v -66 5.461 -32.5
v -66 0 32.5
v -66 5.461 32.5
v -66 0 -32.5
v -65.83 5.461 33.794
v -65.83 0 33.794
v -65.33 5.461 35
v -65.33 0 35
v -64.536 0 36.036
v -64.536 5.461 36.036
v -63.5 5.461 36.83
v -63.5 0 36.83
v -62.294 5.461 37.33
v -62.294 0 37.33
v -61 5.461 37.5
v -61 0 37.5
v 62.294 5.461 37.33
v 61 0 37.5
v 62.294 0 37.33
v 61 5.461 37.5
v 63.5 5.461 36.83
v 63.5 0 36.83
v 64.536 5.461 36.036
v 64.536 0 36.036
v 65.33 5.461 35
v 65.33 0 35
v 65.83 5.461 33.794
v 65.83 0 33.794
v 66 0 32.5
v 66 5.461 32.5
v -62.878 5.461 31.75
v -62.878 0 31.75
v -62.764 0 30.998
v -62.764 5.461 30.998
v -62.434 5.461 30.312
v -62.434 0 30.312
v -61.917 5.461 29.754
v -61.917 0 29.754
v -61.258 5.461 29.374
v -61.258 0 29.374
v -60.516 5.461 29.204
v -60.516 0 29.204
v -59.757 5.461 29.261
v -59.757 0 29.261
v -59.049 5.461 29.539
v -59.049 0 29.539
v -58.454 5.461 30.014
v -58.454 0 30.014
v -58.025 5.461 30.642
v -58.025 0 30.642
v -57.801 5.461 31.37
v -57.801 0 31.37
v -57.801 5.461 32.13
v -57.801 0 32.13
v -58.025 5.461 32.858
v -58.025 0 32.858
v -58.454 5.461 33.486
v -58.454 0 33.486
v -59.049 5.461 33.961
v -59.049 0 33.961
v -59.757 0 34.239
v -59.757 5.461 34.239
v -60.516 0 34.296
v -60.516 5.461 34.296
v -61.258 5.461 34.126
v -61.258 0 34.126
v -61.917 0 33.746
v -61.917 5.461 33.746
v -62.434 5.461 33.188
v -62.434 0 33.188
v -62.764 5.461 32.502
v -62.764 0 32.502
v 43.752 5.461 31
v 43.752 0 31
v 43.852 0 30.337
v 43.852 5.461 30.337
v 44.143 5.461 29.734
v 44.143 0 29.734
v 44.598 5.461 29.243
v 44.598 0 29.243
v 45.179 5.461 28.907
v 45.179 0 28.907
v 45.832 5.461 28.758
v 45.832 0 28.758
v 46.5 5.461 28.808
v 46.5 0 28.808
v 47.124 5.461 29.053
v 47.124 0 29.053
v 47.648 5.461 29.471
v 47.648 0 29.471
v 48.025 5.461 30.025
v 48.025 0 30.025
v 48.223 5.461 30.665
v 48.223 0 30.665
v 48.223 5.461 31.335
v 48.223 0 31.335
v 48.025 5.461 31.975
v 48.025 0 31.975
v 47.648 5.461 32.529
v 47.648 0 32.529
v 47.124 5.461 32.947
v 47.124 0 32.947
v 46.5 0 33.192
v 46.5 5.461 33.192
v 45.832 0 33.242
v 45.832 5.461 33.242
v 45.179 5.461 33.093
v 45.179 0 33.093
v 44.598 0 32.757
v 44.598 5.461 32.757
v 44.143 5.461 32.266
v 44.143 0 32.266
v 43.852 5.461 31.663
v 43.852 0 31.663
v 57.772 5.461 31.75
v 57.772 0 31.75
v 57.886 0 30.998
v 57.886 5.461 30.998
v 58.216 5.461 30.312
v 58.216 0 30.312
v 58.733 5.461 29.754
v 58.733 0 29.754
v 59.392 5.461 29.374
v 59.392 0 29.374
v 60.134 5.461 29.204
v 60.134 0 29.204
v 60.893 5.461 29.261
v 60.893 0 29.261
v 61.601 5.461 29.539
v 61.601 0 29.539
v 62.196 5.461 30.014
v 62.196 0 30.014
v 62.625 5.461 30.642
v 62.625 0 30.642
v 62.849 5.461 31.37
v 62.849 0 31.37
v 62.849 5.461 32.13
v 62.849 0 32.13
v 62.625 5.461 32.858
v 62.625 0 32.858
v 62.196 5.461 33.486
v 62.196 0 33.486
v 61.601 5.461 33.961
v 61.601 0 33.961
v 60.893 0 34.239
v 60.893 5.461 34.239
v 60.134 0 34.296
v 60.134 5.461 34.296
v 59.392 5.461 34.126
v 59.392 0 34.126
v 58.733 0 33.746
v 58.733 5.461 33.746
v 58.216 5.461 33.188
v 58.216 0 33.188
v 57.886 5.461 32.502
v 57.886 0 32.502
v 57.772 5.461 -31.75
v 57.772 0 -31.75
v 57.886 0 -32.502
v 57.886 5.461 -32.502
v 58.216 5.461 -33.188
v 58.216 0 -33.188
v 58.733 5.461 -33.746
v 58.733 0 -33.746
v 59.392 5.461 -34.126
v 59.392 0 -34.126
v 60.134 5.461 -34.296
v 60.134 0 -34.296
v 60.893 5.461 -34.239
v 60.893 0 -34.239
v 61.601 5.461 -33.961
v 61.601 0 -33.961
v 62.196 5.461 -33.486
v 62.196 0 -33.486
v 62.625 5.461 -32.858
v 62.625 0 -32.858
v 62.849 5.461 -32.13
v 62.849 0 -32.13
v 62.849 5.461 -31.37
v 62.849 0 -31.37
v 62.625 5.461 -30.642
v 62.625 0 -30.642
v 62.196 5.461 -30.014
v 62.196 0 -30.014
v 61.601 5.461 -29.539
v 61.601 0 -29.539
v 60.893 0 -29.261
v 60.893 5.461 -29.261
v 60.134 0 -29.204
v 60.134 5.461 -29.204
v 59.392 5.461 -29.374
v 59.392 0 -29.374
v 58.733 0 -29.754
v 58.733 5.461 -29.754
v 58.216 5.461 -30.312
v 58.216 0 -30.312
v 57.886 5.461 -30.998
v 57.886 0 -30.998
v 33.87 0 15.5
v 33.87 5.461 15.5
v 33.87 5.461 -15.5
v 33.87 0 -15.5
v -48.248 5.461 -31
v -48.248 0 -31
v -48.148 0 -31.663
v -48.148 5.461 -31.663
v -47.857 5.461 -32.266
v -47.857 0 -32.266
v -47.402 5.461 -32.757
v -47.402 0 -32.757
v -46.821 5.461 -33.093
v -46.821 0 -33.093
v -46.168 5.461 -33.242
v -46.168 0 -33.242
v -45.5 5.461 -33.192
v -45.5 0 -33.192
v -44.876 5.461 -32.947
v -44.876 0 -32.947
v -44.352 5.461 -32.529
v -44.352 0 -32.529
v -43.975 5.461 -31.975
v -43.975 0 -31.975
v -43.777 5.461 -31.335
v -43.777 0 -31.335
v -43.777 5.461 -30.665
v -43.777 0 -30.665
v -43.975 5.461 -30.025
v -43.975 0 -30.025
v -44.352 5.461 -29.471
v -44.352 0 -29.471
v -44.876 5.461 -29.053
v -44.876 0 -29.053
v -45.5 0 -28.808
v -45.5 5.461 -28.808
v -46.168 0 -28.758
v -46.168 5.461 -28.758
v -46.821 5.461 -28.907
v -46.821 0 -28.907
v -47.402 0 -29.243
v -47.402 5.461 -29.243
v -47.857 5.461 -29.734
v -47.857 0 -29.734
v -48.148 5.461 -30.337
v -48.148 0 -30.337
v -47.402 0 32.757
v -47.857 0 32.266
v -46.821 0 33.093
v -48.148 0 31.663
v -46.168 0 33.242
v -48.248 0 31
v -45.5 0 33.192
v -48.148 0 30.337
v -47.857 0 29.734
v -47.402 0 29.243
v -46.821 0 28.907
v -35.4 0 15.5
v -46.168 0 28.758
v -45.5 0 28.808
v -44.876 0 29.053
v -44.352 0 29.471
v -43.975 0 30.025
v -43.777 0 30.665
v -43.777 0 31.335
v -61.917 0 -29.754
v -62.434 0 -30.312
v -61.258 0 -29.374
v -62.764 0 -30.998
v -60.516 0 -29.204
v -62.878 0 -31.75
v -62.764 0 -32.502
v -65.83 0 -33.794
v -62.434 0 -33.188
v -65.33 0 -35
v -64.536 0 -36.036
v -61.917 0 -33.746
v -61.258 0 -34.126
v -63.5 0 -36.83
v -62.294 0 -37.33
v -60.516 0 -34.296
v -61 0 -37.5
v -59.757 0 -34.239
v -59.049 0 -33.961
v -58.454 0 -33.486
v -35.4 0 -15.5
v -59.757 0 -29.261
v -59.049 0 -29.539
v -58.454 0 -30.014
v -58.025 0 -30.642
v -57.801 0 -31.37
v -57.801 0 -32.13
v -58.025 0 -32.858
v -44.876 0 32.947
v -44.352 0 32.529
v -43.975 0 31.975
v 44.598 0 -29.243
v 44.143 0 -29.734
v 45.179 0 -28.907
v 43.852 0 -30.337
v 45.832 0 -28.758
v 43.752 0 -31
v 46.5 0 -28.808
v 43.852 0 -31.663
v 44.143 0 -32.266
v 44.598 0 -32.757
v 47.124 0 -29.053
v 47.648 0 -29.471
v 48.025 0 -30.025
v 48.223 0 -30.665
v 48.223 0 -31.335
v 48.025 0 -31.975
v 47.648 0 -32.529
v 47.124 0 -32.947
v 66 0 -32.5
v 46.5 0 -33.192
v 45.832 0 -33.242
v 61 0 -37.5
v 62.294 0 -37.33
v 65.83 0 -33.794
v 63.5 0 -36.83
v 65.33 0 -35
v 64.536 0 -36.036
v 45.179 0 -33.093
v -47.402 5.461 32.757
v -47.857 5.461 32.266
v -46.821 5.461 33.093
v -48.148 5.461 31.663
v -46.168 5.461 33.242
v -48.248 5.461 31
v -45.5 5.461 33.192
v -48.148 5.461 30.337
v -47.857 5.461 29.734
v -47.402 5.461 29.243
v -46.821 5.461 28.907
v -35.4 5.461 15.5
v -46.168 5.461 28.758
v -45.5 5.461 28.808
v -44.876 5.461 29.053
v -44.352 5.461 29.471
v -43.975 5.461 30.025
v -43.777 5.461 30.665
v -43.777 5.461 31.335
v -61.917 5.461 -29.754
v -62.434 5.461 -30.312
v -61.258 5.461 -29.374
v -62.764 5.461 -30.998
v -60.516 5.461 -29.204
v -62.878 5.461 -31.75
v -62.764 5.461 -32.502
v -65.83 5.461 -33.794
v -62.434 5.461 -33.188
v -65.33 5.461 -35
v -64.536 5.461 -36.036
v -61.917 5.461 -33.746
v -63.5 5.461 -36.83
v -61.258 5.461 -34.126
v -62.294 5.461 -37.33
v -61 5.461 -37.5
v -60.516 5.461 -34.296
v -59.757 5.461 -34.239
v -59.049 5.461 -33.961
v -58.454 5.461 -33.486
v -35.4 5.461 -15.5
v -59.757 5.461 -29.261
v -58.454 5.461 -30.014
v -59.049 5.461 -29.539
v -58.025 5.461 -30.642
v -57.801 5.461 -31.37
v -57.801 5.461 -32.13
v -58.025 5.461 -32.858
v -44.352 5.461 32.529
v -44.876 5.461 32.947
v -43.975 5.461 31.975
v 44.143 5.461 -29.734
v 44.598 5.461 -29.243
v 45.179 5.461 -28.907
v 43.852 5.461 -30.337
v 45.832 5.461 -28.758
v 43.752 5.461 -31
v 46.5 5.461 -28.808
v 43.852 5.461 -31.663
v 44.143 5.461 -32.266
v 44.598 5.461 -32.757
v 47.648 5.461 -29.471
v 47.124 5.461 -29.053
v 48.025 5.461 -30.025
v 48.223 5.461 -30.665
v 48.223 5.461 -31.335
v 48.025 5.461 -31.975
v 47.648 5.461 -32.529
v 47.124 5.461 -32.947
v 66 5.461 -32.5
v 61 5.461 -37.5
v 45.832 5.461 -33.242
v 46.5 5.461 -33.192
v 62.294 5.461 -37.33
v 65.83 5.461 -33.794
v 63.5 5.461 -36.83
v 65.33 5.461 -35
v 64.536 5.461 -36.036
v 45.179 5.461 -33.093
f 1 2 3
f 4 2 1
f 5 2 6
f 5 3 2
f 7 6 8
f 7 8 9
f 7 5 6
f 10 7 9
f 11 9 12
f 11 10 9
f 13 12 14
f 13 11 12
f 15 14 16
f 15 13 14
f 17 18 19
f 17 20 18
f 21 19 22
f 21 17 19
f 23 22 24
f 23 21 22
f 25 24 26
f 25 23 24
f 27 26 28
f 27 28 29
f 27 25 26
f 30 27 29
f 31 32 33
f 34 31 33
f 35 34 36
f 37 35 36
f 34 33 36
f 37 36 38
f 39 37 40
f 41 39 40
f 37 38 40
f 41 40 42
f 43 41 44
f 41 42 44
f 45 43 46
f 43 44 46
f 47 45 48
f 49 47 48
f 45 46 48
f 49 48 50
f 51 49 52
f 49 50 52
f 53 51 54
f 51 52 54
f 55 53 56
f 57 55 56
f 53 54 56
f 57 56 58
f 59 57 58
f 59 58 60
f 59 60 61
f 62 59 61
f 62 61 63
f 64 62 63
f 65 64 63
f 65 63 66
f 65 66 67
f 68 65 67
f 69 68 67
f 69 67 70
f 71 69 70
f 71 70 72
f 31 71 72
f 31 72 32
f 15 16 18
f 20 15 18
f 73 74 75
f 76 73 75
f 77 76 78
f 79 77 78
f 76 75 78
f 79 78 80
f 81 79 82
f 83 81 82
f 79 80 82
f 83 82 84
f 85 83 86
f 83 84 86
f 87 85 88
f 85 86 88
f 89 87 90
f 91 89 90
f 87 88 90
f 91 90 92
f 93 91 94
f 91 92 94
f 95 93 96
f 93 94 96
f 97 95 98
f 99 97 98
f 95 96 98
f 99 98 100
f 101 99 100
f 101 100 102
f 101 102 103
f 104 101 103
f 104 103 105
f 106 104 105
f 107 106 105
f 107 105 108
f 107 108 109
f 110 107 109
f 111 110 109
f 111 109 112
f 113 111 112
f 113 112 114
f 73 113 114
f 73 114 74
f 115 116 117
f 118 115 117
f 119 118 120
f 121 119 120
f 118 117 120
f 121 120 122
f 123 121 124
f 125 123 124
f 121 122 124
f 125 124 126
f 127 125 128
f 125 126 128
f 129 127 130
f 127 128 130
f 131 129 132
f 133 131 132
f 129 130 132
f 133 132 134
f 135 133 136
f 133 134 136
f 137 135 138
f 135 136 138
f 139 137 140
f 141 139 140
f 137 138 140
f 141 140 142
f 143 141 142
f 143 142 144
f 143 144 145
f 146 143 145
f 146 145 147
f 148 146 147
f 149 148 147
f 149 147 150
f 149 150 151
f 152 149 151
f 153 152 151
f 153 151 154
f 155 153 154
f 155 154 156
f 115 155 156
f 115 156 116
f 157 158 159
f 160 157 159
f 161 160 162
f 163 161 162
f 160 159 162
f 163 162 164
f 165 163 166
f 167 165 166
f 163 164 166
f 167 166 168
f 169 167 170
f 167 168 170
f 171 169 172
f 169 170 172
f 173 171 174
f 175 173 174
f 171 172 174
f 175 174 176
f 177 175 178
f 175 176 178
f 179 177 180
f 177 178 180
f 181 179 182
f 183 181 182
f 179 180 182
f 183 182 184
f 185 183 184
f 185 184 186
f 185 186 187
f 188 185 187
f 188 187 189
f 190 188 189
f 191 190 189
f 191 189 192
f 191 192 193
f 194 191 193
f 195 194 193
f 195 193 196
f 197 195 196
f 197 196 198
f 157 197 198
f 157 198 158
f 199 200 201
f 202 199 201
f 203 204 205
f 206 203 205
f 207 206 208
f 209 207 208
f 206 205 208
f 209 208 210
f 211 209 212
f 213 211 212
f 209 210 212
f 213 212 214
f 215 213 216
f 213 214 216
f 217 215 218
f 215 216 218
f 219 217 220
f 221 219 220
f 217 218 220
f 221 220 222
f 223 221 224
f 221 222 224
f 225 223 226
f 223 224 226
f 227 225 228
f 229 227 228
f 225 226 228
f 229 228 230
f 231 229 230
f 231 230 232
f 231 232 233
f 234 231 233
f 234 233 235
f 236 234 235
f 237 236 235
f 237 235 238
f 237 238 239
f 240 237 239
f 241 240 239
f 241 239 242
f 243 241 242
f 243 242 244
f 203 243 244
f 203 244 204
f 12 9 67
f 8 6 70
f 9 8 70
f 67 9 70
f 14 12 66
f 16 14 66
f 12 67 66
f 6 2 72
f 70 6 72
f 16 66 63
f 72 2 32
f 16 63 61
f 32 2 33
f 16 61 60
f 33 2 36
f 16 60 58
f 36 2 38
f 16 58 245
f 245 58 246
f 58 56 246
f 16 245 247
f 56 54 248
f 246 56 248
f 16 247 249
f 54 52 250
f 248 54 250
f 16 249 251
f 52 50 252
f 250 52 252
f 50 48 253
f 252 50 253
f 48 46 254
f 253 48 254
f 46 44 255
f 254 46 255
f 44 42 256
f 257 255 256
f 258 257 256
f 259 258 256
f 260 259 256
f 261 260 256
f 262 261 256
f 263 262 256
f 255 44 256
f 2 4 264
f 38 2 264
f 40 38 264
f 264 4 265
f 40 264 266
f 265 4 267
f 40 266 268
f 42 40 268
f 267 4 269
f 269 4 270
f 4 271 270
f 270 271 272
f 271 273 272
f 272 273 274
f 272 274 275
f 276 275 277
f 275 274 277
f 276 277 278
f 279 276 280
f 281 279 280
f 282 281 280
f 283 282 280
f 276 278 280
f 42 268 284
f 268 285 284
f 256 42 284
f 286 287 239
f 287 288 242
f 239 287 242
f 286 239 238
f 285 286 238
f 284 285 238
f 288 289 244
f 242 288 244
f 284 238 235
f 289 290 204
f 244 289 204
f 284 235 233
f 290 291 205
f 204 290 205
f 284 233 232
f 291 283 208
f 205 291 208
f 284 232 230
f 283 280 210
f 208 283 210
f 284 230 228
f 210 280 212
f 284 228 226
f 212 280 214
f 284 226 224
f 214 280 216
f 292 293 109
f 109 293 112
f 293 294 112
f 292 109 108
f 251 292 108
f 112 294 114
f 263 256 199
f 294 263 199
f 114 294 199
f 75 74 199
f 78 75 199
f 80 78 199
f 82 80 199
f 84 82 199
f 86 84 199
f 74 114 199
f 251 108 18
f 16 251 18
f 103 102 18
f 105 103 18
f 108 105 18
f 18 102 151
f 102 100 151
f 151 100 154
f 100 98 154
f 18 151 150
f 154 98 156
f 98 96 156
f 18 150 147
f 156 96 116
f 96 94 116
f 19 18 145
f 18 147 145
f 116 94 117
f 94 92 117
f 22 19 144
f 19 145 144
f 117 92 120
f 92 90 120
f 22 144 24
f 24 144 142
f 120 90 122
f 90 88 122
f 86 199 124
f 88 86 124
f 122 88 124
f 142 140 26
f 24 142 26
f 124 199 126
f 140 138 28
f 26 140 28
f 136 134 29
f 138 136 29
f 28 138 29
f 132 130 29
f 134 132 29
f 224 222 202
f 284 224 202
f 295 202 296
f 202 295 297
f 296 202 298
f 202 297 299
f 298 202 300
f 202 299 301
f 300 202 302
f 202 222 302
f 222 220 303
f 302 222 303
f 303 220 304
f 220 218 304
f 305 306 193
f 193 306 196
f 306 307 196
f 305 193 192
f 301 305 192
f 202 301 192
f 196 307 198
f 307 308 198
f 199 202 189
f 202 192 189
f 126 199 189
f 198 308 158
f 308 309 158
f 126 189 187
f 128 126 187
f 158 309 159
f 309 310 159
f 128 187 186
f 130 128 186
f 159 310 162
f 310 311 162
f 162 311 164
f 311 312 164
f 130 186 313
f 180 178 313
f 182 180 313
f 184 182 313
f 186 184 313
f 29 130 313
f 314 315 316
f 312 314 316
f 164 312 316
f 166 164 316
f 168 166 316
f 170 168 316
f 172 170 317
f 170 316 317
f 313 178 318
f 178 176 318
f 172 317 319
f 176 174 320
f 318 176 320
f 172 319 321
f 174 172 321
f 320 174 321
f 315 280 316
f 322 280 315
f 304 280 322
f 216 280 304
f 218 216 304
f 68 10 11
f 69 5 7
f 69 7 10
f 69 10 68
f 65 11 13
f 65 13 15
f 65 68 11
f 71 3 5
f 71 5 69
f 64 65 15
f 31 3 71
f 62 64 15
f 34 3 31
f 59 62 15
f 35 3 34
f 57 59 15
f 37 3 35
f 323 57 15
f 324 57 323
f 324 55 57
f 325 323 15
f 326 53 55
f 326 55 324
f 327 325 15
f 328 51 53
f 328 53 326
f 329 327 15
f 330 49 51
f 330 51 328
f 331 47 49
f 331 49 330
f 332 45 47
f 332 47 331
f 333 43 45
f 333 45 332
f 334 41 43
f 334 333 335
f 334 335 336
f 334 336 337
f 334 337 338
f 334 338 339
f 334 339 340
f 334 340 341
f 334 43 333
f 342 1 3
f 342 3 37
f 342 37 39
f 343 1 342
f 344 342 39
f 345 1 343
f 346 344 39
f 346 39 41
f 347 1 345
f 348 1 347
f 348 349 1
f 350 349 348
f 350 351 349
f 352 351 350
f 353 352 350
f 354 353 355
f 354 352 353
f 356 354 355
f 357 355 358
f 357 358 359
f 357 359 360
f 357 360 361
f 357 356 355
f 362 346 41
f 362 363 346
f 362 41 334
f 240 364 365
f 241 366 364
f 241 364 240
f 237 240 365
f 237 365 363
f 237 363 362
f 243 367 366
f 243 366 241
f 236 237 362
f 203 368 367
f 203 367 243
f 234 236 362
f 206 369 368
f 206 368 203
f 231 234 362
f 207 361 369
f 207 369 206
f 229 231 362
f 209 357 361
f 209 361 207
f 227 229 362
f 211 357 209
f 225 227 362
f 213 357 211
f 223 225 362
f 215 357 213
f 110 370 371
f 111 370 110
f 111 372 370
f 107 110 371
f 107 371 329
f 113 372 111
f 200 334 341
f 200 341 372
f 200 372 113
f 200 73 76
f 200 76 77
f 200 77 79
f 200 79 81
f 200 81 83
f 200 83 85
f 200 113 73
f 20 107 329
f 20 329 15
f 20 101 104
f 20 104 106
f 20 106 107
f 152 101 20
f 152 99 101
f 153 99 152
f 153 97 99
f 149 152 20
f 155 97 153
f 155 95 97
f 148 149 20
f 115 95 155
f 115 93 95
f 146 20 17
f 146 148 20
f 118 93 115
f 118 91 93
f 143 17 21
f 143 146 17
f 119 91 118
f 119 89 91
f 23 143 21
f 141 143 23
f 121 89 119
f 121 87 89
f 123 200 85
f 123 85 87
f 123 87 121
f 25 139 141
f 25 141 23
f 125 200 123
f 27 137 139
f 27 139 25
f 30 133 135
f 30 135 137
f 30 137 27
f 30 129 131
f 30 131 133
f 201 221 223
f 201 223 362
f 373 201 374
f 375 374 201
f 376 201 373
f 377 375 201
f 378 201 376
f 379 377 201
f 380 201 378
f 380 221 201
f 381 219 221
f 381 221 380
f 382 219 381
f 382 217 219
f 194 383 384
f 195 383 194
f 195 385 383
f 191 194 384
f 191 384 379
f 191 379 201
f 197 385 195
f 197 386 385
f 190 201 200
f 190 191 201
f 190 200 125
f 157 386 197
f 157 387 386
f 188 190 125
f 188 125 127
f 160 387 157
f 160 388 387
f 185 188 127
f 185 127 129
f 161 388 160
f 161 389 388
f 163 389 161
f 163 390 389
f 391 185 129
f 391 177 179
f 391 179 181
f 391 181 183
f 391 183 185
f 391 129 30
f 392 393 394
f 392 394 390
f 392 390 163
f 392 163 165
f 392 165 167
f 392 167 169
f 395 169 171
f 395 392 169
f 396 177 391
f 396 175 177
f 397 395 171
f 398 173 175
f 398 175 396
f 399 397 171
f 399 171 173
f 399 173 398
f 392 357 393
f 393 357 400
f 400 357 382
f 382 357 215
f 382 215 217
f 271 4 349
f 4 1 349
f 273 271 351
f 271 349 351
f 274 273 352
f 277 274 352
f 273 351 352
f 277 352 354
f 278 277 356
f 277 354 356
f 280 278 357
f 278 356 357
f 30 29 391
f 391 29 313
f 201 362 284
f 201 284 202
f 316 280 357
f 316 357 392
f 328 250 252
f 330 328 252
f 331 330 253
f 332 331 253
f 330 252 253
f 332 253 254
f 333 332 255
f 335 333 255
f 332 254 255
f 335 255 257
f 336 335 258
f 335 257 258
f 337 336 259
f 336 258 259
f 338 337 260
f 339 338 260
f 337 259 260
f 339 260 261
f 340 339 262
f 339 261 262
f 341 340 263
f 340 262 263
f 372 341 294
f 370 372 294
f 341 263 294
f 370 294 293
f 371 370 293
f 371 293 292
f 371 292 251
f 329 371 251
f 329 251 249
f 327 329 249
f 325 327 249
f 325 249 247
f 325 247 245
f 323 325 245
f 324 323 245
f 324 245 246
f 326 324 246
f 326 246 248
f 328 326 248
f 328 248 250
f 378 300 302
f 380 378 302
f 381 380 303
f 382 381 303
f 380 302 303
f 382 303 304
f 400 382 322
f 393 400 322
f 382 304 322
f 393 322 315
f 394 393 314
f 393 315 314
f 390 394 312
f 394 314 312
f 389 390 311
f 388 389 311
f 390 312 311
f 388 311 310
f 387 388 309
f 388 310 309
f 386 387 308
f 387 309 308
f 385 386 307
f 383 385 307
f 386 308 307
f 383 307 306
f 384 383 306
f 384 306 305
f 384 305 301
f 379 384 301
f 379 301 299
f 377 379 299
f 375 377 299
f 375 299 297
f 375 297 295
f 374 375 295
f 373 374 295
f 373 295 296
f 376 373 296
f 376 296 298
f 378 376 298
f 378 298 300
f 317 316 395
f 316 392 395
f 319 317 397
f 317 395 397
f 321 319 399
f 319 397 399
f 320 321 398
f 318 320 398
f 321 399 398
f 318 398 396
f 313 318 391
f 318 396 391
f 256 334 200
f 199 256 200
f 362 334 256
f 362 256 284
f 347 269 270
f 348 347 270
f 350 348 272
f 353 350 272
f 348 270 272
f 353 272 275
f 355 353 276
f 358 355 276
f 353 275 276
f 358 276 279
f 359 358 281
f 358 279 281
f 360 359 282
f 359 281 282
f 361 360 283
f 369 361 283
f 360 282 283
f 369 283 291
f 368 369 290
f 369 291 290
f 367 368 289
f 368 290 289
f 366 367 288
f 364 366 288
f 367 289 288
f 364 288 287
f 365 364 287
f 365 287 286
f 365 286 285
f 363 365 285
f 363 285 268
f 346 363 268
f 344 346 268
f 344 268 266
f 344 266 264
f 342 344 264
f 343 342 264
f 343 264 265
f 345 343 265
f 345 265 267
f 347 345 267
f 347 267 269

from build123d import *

# Parameters (mm, degrees)
SKETCH2_W              = 132
SKETCH2_H              = 75
BOSS_EXTRUDE1_DEPTH    = 5.461
F_8_CLEARANCE_HOLE1_D  = 4.4958
F_10_CLEARANCE_HOLE1_D = 5.1054
FILLET1_R              = 5
SKETCH7_W              = 69.27
SKETCH7_H              = 31
CUT_EXTRUDE1_DEPTH     = 6.461


with BuildPart() as part:
    # Sketch2 → Boss-Extrude1 (new body)
    with BuildSketch(Plane(origin=(0, 0, 0), x_dir=(1, 0, 0), z_dir=(0, 1, 0))):
        Rectangle(SKETCH2_W, SKETCH2_H)
    extrude(amount=BOSS_EXTRUDE1_DEPTH)

    # #8 Clearance Hole1 (through all)
    with Locations(Plane(origin=(0, 5.461, 0), x_dir=(1, 0, 0), z_dir=(0, 1, 0))):
        with Locations((46, -31), (-46, 31), (-46, -31), (46, 31)):
            Hole(F_8_CLEARANCE_HOLE1_D / 2)

    # #10 Clearance Hole1 (through all)
    with Locations(Plane(origin=(0, 5.461, 0), x_dir=(1, 0, 0), z_dir=(0, 1, 0))):
        with Locations((60.325, -31.75), (-60.325, 31.75), (-60.325, -31.75), (60.325, 31.75)):
            Hole(F_10_CLEARANCE_HOLE1_D / 2)

    # Fillet1
    fillet1_edges = [part.edges().sort_by_distance(p)[0] for p in [
        (66, 2.7305, 37.5),
        (-66, 2.7305, 37.5),
        (-66, 2.7305, -37.5),
        (66, 2.7305, -37.5),
    ]]
    fillet(fillet1_edges, radius=FILLET1_R)

    # Sketch7 → Cut-Extrude1 (cut, through all)
    with BuildSketch(Plane(origin=(0, 5.461, 0), x_dir=(1, 0, 0), z_dir=(0, 1, 0))):
        with Locations((-0.765, 0)):
            Rectangle(SKETCH7_W, SKETCH7_H)
    extrude(amount=-CUT_EXTRUDE1_DEPTH, mode=Mode.SUBTRACT)


solid = part.part
